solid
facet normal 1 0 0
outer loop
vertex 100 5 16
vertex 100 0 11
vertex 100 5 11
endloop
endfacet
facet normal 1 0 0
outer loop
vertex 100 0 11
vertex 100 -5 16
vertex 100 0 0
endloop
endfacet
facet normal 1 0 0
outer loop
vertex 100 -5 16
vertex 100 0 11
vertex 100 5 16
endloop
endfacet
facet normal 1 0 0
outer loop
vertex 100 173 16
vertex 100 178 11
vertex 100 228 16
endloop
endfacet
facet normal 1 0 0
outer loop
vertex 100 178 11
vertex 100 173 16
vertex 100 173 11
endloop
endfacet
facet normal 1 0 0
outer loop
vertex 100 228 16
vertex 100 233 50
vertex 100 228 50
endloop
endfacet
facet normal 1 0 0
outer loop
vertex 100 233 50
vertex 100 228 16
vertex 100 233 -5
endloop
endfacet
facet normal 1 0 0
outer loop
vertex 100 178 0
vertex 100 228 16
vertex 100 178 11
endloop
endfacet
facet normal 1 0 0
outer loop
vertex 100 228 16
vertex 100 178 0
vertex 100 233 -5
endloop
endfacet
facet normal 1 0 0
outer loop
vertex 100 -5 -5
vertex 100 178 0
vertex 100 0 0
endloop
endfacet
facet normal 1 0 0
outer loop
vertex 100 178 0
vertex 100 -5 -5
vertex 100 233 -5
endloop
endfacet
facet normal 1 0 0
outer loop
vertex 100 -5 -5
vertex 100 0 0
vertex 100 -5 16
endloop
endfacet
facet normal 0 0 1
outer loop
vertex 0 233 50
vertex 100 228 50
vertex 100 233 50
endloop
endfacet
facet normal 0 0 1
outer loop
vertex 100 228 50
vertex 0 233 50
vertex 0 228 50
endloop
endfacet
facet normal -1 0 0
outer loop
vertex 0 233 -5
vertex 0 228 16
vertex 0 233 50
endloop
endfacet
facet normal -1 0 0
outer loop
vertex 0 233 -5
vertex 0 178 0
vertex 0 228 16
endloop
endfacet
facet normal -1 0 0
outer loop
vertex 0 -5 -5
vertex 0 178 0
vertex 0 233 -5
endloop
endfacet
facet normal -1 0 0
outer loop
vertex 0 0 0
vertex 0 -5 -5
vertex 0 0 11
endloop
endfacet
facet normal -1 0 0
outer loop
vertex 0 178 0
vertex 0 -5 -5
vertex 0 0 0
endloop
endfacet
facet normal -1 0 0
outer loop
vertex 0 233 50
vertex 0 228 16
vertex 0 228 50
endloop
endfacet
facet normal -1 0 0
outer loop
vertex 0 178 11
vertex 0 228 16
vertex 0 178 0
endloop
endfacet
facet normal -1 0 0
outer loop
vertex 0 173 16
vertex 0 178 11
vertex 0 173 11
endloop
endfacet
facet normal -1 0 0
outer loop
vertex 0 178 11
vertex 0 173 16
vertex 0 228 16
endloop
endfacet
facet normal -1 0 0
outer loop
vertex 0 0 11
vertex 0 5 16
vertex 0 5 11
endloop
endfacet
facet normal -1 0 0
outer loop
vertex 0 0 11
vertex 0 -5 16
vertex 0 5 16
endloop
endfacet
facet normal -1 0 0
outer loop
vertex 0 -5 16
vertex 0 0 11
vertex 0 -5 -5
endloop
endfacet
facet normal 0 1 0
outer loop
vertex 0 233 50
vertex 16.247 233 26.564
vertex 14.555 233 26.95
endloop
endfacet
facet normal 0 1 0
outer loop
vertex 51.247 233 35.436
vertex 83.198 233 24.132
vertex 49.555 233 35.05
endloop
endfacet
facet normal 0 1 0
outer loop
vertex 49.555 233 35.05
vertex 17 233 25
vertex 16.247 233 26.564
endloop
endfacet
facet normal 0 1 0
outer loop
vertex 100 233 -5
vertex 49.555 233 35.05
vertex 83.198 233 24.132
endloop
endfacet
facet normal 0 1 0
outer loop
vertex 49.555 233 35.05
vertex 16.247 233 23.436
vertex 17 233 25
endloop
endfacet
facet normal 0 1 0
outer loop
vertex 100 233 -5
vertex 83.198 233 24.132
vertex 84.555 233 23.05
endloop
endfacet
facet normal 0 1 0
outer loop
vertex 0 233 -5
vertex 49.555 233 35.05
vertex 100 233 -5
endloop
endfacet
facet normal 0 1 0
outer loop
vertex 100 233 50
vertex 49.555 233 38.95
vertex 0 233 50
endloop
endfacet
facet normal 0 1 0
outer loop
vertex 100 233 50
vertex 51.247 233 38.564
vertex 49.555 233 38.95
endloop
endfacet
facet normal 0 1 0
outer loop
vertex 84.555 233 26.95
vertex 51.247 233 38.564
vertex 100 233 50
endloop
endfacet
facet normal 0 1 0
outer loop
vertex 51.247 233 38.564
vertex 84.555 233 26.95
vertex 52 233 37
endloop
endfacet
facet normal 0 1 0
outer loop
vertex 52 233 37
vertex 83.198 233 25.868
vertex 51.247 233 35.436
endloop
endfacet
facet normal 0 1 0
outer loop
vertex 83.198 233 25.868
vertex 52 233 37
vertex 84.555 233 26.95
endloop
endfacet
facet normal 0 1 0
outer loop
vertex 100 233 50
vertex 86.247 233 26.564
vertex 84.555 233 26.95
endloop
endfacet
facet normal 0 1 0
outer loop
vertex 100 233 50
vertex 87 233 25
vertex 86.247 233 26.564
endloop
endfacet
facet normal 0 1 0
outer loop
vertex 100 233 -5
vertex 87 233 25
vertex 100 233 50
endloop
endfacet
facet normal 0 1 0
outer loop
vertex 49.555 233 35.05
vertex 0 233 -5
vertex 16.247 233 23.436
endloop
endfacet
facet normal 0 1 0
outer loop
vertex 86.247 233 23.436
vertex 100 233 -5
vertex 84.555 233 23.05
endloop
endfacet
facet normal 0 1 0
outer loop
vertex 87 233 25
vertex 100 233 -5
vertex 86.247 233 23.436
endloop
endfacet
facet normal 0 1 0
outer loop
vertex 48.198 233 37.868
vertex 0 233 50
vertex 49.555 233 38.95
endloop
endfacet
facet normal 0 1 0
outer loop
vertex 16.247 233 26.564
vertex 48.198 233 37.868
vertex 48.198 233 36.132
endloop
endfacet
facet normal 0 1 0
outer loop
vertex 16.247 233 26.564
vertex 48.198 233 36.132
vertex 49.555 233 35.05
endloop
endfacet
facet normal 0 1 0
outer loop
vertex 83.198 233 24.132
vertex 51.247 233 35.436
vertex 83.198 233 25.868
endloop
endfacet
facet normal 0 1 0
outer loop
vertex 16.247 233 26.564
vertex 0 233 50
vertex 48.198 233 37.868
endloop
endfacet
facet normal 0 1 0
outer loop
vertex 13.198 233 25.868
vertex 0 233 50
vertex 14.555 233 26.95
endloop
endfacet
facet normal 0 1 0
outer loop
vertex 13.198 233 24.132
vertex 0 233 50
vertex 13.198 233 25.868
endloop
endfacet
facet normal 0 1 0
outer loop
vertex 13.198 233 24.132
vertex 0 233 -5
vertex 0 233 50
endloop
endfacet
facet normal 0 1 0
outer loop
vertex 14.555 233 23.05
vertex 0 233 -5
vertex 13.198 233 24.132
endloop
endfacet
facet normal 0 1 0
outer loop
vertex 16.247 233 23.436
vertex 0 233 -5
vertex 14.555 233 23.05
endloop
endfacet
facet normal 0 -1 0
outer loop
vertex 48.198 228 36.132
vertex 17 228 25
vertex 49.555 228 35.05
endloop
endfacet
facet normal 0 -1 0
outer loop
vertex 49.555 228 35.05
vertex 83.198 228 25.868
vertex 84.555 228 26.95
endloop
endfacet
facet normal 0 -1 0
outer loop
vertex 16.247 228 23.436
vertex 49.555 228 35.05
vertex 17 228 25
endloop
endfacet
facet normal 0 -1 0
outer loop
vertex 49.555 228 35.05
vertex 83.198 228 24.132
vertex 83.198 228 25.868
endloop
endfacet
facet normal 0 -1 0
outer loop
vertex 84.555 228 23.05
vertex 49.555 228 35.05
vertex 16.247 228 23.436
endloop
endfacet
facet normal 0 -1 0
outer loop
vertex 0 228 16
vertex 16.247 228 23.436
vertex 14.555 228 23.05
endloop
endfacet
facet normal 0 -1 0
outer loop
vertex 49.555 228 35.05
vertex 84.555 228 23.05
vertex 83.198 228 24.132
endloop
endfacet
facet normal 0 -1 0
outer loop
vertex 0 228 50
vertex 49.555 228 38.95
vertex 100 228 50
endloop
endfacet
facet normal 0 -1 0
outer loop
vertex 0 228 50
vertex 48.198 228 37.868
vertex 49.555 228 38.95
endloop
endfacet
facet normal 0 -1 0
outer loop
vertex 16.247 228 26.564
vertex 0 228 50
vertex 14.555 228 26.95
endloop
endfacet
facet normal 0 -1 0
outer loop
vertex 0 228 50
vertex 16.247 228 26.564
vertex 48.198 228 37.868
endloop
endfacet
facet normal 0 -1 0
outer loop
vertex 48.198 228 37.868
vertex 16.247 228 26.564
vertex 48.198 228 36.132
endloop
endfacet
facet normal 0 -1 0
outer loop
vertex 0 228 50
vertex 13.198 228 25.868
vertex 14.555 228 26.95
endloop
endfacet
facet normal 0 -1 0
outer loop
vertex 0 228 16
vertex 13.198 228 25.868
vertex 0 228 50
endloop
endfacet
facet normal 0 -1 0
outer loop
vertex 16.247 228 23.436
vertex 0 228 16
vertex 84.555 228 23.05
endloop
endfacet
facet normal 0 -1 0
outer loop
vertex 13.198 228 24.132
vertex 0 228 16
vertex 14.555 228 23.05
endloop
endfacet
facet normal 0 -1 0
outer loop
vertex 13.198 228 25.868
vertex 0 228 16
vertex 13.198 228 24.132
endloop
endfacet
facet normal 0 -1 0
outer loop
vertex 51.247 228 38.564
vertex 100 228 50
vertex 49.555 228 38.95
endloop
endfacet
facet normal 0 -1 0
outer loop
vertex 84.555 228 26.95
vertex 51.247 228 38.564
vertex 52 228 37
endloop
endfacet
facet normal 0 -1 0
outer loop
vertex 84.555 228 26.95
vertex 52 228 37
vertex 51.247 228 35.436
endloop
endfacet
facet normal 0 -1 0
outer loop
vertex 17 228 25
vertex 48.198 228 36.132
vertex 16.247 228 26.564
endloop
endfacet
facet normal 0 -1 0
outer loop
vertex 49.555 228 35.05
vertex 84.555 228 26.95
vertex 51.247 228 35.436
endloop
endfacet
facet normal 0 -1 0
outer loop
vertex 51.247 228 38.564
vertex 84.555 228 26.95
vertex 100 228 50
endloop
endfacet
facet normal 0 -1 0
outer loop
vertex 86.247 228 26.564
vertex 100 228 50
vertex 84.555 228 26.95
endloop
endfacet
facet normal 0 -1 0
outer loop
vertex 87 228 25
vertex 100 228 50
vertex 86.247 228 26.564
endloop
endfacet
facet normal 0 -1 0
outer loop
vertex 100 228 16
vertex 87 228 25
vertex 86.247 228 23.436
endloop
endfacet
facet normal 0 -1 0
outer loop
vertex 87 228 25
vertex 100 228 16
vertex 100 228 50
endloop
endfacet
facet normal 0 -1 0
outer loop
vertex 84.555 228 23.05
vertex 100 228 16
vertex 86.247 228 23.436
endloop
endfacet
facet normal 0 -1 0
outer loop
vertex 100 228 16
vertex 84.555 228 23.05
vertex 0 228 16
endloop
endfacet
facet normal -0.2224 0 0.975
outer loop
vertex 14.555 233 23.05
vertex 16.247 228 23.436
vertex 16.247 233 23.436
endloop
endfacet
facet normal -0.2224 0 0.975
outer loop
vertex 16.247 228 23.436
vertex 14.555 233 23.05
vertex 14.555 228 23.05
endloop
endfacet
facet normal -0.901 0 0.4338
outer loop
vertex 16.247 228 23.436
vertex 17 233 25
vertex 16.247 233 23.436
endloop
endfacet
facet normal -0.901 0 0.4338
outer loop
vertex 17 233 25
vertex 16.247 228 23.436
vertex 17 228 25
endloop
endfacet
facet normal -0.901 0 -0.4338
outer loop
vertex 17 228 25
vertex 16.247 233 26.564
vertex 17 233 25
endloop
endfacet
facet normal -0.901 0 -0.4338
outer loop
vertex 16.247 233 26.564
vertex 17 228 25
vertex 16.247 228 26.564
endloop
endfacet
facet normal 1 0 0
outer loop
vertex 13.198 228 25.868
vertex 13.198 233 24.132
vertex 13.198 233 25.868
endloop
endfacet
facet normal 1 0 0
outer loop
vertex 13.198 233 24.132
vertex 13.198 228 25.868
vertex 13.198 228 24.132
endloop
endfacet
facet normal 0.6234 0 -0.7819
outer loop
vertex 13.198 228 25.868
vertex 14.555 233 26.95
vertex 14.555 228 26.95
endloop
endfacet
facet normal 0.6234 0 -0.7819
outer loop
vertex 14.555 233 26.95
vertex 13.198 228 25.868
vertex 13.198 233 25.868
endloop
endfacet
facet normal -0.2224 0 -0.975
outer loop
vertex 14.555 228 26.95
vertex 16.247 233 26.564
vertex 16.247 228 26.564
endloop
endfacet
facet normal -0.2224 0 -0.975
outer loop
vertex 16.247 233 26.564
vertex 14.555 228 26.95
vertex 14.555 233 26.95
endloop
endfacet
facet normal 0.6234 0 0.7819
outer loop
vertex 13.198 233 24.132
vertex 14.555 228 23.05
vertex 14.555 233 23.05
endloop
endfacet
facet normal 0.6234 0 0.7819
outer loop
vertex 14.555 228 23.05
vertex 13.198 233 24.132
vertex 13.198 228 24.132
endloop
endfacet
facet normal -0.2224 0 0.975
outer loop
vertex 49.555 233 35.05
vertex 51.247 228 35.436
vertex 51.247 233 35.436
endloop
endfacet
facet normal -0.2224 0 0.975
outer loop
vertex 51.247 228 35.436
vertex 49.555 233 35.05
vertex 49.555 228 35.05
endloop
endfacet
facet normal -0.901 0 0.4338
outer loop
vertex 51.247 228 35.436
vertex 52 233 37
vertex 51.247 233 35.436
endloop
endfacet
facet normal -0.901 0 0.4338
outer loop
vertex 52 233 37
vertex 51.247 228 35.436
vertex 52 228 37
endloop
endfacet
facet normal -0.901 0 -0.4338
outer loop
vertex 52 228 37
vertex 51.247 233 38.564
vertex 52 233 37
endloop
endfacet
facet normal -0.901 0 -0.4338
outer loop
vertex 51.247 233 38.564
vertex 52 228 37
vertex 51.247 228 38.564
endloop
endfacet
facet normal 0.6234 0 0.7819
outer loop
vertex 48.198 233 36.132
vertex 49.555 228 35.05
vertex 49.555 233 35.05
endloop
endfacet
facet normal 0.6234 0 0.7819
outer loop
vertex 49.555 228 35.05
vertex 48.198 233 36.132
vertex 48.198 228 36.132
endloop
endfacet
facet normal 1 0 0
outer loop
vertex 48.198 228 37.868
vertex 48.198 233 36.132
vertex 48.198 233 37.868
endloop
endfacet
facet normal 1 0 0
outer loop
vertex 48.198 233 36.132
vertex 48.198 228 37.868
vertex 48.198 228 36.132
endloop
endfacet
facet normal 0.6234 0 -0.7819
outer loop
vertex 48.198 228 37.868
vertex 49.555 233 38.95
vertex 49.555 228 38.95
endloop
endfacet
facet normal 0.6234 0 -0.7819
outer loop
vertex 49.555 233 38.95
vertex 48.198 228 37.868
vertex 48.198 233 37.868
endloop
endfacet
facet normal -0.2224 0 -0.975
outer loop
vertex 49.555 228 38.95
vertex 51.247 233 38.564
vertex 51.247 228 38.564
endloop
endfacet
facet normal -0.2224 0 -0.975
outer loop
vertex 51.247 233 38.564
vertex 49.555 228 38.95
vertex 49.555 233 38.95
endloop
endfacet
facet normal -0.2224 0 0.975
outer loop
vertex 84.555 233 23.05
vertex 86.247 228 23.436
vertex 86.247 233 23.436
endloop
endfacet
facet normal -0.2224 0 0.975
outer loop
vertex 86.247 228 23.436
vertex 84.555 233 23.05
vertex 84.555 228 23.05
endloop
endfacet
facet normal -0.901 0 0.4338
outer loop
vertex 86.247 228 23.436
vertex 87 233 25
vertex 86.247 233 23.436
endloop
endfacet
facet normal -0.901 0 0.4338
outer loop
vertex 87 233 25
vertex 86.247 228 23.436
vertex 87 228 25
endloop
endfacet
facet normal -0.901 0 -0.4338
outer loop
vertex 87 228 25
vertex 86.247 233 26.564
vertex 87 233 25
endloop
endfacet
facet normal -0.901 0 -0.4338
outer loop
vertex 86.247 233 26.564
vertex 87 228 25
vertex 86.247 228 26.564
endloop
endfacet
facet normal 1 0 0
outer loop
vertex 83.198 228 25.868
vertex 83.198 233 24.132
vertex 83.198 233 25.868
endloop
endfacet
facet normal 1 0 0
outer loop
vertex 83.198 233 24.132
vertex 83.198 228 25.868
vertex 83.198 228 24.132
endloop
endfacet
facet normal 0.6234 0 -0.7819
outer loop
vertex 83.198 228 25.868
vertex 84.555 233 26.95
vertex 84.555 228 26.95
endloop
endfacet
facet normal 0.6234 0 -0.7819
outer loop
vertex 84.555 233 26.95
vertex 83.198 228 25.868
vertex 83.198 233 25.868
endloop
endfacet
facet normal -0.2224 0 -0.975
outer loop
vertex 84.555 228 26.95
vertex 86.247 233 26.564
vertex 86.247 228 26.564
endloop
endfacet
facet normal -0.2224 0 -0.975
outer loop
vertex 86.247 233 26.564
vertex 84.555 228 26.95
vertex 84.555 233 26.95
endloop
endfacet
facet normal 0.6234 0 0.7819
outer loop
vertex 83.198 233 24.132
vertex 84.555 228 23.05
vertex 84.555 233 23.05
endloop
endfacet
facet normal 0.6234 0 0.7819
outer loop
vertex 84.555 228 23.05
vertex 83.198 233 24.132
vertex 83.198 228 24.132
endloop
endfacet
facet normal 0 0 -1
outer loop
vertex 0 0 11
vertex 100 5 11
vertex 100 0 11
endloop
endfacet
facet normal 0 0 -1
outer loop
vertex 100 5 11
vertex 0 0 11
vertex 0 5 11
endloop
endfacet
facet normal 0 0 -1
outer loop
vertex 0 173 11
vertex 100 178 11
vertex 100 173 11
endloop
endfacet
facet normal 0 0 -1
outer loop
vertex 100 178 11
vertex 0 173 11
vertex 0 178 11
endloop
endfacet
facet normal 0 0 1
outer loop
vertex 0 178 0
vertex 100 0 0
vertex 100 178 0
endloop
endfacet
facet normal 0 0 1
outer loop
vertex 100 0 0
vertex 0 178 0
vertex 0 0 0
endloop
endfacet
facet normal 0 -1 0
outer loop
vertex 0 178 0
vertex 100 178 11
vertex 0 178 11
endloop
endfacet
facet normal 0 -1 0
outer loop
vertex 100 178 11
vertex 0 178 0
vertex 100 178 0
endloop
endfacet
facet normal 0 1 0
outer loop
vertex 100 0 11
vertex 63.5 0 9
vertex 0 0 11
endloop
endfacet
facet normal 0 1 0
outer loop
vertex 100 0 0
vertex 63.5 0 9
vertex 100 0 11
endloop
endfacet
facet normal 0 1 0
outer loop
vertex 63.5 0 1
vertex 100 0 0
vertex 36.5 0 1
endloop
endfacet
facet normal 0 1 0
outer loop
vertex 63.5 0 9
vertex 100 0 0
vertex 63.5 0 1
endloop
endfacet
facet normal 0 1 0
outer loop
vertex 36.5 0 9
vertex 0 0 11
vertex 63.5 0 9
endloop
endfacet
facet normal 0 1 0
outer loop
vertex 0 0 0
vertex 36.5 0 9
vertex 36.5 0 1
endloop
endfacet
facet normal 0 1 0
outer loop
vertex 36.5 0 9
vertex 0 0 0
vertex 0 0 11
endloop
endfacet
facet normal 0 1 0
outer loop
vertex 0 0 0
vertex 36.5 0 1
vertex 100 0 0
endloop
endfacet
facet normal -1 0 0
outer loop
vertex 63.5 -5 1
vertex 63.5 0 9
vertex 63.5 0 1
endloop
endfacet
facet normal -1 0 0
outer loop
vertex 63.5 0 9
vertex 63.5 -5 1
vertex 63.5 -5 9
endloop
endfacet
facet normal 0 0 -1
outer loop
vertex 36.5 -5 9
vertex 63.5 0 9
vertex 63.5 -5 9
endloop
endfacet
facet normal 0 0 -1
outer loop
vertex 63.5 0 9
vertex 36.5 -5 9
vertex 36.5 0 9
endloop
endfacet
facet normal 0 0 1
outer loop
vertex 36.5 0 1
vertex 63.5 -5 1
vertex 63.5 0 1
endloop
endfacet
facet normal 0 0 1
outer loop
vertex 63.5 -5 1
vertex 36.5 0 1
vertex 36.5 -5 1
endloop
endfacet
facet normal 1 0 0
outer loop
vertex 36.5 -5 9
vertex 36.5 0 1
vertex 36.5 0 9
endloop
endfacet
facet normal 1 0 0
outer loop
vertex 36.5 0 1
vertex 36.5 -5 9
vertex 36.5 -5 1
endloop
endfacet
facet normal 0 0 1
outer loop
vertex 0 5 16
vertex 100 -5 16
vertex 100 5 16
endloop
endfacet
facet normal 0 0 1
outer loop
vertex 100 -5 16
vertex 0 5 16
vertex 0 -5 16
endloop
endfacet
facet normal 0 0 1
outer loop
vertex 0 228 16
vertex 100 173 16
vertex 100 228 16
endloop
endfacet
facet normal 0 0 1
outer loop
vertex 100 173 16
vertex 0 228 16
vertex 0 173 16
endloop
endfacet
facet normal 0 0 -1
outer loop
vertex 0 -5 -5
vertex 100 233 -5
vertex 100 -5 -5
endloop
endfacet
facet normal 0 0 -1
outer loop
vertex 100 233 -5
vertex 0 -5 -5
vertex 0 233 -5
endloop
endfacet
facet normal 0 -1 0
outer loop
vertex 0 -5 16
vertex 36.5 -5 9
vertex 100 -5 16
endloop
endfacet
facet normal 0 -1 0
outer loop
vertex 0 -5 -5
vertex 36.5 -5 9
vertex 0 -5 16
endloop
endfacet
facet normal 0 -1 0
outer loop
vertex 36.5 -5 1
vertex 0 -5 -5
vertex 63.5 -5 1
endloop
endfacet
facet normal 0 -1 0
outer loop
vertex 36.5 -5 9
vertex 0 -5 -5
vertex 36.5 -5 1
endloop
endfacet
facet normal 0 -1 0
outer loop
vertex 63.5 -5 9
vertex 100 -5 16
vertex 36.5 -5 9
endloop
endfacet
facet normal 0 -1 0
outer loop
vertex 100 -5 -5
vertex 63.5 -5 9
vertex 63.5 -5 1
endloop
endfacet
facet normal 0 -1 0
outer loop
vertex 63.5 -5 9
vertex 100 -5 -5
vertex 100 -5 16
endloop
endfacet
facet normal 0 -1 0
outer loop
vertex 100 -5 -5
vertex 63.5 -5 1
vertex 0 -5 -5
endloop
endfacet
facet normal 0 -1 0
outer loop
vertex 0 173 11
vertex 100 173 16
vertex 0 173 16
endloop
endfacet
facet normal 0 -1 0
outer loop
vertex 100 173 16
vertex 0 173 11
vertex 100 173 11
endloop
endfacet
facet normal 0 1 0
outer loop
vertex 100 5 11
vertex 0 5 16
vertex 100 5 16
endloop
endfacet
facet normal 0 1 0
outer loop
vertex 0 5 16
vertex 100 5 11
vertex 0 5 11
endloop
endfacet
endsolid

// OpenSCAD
tablet_width=263;
height=178;
thick=11;
width=100;
distance=50;



translate([0,height+distance,0]) {
    difference() {
        cube([width,5,50]);
        translate([15,0,25]) rotate([-90,0,0]) cylinder(d=4,h=10,center=true);
        translate([width/2,0,37]) rotate([-90,0,0]) cylinder(d=4,h=10,center=true);
        translate([width-15,0,25]) rotate([-90,0,0]) cylinder(d=4,h=10,center=true);
   }
}
difference() {
    translate([0,-5,-5]) cube([width,height+10+distance, thick+10]);
    translate([-(tablet_width-width)/2,5,0]) cube([tablet_width,height-10, thick+10]);
    union(){
        translate([-1,0,0])cube([width+2,height,thick]);
        translate([(width-27)/2, -23, 1]) cube([27,24,8]);
    }
}
